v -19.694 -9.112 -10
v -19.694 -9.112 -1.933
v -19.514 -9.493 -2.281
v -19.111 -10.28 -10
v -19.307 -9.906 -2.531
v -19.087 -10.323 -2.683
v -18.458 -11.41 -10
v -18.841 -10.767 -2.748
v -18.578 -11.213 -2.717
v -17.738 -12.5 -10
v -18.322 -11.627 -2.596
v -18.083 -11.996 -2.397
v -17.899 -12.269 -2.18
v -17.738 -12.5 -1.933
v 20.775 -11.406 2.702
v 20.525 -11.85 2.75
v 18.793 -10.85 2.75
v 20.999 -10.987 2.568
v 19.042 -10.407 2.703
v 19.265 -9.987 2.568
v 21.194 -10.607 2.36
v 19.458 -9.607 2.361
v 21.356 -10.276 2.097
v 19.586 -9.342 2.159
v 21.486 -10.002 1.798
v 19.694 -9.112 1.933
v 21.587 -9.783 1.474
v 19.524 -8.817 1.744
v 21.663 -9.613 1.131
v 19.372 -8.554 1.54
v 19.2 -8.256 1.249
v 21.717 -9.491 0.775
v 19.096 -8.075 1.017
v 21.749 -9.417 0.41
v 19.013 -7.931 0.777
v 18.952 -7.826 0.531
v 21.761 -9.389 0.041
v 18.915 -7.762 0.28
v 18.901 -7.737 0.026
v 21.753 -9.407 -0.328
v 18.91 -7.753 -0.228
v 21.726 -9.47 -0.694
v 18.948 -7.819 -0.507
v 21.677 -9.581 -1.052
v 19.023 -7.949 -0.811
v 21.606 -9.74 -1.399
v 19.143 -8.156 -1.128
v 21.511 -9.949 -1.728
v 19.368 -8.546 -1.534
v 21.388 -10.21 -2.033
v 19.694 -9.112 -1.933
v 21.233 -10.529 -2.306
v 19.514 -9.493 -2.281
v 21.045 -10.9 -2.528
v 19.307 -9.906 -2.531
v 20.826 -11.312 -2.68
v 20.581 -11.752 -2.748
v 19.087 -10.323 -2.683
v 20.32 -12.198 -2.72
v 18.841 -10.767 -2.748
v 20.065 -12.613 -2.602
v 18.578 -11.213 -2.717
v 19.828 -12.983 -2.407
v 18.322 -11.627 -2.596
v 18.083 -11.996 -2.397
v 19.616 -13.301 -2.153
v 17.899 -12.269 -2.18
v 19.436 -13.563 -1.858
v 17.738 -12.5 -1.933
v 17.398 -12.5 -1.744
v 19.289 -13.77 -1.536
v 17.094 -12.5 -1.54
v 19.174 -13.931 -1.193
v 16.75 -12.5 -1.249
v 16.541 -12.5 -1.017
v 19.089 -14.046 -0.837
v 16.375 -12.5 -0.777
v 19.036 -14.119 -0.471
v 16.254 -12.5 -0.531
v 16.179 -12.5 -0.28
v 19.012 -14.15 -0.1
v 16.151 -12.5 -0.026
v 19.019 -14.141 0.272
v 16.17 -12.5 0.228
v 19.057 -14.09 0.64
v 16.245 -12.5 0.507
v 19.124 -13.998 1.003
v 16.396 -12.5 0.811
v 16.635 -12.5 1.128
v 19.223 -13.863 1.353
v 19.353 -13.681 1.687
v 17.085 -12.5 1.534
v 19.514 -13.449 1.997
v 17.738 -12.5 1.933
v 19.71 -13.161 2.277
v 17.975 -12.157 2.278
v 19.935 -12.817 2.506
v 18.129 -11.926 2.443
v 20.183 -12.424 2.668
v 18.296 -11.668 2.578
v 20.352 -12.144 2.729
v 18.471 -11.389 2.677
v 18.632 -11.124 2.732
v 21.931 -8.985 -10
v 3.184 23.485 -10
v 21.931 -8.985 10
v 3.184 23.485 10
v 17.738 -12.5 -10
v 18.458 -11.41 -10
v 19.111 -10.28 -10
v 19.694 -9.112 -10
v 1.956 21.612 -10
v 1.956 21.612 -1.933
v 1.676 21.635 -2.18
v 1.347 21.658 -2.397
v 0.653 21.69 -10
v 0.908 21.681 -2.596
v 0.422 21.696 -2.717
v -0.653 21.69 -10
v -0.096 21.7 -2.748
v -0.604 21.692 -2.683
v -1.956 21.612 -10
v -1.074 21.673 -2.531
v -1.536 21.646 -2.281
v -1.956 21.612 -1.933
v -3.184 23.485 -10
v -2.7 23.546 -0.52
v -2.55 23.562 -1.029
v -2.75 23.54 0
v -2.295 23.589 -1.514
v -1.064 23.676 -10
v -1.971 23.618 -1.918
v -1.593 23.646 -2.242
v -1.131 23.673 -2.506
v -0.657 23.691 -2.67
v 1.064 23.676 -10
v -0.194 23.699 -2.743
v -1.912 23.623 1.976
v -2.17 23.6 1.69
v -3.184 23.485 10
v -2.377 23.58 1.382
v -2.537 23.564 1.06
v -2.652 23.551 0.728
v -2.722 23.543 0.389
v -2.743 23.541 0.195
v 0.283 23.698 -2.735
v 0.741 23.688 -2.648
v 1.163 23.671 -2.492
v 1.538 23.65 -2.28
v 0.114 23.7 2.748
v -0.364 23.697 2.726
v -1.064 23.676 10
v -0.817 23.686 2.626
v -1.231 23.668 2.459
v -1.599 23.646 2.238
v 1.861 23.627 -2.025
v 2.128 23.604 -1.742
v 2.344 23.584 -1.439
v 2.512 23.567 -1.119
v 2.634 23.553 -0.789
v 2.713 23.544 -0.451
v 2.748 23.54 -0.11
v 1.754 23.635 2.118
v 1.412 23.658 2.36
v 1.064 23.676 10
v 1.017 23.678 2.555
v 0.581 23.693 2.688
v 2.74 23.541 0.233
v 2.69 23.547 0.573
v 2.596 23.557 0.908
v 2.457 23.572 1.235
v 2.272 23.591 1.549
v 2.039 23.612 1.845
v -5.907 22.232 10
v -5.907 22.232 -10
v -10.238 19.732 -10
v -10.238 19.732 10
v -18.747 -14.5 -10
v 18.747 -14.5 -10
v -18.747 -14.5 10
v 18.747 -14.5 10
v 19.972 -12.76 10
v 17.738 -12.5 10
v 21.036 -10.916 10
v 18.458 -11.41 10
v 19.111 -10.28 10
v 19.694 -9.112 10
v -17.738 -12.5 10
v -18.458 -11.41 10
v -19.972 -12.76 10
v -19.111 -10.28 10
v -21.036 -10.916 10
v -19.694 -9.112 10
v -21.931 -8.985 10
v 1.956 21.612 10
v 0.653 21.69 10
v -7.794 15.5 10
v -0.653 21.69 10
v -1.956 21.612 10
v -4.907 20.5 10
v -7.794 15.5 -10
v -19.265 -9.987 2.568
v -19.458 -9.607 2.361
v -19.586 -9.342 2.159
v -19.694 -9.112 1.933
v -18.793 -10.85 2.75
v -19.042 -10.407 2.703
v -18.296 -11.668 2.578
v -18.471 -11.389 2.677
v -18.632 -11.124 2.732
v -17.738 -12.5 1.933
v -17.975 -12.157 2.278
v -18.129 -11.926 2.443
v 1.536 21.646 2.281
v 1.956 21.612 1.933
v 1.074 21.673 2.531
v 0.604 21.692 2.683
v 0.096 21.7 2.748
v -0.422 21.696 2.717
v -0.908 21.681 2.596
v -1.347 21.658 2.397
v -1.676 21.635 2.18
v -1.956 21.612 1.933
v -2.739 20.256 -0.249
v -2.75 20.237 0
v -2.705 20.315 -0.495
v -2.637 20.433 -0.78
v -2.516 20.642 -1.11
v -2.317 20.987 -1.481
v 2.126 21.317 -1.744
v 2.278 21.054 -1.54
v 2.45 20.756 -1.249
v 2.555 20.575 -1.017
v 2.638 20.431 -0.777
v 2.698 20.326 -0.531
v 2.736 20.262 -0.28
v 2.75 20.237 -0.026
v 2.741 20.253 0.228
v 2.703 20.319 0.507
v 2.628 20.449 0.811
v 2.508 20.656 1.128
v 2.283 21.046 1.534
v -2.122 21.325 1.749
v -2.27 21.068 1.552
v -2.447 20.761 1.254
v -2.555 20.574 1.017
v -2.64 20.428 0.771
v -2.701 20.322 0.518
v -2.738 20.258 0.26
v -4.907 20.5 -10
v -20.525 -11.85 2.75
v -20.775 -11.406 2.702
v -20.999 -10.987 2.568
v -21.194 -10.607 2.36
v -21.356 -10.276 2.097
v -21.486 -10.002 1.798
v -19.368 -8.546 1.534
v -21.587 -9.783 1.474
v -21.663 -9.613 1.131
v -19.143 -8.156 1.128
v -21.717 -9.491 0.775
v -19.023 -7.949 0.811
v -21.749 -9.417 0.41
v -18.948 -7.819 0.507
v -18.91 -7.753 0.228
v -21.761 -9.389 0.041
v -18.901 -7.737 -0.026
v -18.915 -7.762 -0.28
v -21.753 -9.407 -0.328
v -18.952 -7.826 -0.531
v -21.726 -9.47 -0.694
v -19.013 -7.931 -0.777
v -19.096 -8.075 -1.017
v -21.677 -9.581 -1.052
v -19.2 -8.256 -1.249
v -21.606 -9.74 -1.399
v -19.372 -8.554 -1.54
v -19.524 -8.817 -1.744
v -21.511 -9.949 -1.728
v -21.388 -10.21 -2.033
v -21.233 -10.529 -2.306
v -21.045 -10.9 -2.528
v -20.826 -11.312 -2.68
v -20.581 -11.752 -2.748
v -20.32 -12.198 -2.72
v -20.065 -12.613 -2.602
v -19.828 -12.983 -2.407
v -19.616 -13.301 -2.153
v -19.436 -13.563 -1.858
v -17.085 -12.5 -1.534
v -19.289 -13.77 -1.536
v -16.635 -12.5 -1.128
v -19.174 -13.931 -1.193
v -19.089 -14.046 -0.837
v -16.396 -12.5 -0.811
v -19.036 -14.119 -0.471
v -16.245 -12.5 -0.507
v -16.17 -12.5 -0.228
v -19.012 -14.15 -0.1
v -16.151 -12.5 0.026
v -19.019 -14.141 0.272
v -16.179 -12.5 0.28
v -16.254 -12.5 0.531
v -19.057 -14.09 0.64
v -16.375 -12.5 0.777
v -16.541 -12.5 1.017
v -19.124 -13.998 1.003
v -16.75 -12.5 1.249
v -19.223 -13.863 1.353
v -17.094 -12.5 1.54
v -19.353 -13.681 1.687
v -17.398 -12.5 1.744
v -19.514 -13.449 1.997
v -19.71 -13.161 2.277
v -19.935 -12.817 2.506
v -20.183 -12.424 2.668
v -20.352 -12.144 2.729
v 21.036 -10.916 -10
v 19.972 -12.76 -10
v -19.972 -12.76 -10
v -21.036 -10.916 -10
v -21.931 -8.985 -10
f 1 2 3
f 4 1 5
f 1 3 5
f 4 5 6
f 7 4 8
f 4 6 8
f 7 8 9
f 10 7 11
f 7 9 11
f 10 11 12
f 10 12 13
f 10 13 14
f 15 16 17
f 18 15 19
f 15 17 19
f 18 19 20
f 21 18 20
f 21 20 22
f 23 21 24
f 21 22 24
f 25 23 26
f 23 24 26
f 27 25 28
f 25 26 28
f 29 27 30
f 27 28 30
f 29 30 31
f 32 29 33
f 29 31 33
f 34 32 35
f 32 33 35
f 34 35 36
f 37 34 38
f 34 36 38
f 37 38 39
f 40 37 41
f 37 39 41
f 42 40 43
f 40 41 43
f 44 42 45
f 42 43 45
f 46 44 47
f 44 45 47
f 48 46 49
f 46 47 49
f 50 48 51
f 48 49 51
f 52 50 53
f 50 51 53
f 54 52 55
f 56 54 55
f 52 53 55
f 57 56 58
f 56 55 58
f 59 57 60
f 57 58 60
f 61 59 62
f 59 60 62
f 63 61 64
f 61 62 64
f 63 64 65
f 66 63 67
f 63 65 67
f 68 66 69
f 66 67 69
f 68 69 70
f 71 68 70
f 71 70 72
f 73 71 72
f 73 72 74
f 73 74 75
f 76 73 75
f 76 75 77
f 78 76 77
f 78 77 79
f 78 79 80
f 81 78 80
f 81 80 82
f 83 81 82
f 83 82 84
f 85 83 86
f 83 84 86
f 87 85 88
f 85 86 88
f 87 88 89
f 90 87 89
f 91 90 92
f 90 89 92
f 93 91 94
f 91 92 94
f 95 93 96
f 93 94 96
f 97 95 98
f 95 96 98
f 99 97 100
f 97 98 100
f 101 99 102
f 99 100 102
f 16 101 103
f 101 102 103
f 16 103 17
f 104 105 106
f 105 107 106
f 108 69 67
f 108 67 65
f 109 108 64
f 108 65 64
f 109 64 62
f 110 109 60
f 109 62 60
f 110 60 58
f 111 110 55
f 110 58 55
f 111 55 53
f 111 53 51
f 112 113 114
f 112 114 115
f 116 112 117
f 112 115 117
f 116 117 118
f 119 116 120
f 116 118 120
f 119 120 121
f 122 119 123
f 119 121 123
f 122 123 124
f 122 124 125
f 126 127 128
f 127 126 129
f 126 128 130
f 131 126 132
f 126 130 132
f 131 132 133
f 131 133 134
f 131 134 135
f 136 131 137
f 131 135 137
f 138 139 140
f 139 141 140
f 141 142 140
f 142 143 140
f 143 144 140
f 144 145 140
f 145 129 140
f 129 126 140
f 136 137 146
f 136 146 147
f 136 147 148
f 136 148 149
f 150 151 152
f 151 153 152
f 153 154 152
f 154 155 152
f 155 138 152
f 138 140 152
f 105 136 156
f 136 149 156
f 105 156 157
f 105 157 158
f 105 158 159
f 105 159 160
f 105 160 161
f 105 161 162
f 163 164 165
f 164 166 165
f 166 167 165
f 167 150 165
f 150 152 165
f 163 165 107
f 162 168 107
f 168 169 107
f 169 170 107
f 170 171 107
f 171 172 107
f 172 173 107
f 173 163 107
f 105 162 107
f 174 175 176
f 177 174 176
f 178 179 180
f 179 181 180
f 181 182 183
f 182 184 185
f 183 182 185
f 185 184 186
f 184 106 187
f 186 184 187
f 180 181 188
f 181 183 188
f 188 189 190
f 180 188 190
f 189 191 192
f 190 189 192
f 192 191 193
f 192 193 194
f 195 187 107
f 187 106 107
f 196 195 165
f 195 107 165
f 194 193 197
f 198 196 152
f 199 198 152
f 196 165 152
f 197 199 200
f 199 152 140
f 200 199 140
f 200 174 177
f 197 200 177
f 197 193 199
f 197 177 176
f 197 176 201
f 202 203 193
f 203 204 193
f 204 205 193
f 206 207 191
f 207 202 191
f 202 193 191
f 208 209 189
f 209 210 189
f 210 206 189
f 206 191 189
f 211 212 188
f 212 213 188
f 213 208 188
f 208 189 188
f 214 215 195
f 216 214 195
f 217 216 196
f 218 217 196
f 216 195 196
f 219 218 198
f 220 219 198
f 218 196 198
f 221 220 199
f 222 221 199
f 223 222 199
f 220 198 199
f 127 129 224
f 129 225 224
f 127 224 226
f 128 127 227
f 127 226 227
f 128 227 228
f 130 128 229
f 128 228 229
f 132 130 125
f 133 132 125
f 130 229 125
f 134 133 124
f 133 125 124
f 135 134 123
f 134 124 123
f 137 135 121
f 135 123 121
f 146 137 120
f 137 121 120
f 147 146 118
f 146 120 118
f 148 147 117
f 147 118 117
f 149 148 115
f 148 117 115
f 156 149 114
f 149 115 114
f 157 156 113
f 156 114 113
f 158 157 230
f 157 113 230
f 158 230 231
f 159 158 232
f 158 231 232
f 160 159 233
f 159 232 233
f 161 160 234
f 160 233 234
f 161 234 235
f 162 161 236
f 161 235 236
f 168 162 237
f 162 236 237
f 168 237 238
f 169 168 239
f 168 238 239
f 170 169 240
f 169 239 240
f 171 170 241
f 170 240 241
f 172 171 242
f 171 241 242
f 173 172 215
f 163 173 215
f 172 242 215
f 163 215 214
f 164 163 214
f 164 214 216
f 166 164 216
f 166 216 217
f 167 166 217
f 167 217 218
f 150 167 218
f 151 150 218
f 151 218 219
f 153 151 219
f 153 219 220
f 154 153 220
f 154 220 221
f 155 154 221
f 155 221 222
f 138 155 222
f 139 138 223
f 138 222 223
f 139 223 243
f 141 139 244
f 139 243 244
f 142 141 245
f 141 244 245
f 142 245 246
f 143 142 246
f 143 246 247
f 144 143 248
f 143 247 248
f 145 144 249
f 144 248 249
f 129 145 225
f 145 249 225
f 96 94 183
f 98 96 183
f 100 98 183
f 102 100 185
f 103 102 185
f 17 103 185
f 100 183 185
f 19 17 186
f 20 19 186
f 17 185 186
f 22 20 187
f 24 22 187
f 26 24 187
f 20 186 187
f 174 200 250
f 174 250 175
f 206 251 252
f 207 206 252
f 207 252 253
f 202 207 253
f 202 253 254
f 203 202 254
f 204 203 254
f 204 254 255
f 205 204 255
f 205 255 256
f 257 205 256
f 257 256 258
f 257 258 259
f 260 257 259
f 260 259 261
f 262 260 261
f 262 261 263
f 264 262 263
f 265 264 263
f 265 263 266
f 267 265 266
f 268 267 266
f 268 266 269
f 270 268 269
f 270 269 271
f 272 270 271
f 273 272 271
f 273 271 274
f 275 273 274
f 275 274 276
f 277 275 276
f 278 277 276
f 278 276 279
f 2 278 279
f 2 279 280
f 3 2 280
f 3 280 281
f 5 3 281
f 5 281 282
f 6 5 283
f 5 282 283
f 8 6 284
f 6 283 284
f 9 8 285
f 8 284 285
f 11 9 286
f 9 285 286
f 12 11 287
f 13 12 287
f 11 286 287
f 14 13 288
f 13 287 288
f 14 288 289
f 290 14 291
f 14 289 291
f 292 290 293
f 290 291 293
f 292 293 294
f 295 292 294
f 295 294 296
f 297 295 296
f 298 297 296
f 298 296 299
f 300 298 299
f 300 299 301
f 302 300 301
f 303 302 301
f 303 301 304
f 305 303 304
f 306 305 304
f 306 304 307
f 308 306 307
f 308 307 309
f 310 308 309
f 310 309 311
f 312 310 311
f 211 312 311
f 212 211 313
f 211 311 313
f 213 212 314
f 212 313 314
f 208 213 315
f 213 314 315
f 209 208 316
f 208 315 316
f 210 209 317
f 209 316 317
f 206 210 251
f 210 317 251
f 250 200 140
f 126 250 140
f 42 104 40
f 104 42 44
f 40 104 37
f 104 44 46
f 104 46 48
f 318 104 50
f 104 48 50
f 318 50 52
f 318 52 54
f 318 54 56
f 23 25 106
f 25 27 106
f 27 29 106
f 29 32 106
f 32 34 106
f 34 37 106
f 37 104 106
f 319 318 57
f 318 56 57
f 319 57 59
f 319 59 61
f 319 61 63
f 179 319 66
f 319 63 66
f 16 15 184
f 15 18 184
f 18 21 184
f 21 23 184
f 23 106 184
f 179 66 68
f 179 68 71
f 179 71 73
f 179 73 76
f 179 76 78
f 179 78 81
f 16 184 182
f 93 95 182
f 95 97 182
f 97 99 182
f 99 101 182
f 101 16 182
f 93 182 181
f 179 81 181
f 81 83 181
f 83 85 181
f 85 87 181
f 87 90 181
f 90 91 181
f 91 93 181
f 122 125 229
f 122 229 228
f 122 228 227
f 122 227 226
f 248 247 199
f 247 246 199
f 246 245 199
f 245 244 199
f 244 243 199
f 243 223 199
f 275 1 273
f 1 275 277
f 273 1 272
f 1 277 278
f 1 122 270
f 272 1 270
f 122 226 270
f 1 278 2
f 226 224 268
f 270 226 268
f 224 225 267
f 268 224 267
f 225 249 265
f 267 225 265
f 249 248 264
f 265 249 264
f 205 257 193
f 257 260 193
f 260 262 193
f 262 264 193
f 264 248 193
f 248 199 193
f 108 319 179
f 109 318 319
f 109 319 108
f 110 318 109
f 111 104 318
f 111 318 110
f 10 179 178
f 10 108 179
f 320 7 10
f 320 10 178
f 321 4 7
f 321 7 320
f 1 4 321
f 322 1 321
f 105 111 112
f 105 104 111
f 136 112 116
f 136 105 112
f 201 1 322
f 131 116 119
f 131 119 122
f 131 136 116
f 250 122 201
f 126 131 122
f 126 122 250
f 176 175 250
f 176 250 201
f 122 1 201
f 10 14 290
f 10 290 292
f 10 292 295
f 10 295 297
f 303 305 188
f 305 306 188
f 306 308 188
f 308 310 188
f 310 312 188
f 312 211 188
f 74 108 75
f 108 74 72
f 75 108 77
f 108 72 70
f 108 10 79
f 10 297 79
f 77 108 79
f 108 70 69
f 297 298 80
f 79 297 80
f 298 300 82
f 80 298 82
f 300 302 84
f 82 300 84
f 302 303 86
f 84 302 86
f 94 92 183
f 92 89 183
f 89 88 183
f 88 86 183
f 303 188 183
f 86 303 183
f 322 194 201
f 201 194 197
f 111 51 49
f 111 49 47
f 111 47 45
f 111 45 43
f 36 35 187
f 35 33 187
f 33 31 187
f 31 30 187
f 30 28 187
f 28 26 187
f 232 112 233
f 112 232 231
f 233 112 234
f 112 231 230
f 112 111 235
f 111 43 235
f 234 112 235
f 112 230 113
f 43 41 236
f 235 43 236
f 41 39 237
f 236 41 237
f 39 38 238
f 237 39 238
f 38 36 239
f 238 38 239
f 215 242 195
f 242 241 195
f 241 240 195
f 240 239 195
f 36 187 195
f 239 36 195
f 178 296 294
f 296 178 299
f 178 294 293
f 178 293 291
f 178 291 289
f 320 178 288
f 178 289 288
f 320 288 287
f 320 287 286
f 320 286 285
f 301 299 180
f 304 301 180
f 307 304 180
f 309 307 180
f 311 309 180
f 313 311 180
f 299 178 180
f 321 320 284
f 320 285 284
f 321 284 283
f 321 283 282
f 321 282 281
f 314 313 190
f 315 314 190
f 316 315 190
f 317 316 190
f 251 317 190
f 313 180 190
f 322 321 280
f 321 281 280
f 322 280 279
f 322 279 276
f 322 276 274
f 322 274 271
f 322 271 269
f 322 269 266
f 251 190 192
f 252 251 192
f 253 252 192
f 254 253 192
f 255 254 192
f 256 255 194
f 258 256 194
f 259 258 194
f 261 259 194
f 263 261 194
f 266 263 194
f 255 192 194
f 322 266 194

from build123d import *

# Parameters (mm, degrees)
BOSS_EXTRU_1_DEPTH      = 10
ESQUISSE2_R             = 2.75
ENL_V_MAT_EXTRU_1_DEPTH = 10
ESQUISSE3_R             = 2.75
ENL_V_MAT_EXTRU_2_DEPTH = 10
ESQUISSE4_R             = 2.75
ENL_V_MAT_EXTRU_3_DEPTH = 10
BOSS_EXTRU_4_DEPTH      = 20


with BuildPart() as part:
    # Esquisse1 → Boss.-Extru.1 (new body, symmetric)
    with BuildSketch(Plane.XY):
        with BuildLine():
            ThreePointArc((-3.184001831, 23.485147058), (0, 23.7), (3.184001831, 23.485147058))
            Line((3.184001831, 23.485147058), (21.930734879, -8.985147058))
            ThreePointArc((21.930734879, -8.985147058), (20.52480207, -11.85), (18.746733049, -14.5))
            Line((18.746733049, -14.5), (-18.746733049, -14.5))
            ThreePointArc((-18.746733049, -14.5), (-20.52480207, -11.85), (-21.930734879, -8.985147058))
            Line((-21.930734879, -8.985147058), (-3.184001831, 23.485147058))
        make_face()
        with BuildLine():
            ThreePointArc((17.738094599, -12.5), (18.792751262, -10.85), (19.694364847, -9.111640537))
            Line((19.694364847, -9.111640537), (1.956270248, 21.611640537))
            ThreePointArc((1.956270248, 21.611640537), (0, 21.7), (-1.956270248, 21.611640537))
            Line((-1.956270248, 21.611640537), (-19.694364847, -9.111640537))
            ThreePointArc((-19.694364847, -9.111640537), (-18.792751262, -10.85), (-17.738094599, -12.5))
            Line((-17.738094599, -12.5), (17.738094599, -12.5))
        make_face(mode=Mode.SUBTRACT)
    extrude(amount=BOSS_EXTRU_1_DEPTH, both=True)

    # Esquisse2 → Enlèv. mat.-Extru.1 (cut, symmetric)
    with BuildSketch(Plane(origin=(20.338733964, -11.742573529, 0), x_dir=(0, 0, 1), z_dir=(-0.866025404, 0.5, 0))):
        Circle(ESQUISSE2_R)
    extrude(amount=ENL_V_MAT_EXTRU_1_DEPTH, both=True, mode=Mode.SUBTRACT)

    # Esquisse3 → Enlèv. mat.-Extru.2 (cut, symmetric)
    with BuildSketch(Plane(origin=(-20.338733964, -11.742573529, 0), x_dir=(0, 0, 1), z_dir=(-0.866025404, -0.5, 0))):
        Circle(ESQUISSE3_R)
    extrude(amount=ENL_V_MAT_EXTRU_2_DEPTH, both=True, mode=Mode.SUBTRACT)

    # Esquisse4 → Enlèv. mat.-Extru.3 (cut, symmetric)
    with BuildSketch(Plane(origin=(0, 23.485147058, 0), x_dir=(-1, 0, 0), z_dir=(0, -1, 0))):
        Circle(ESQUISSE4_R)
    extrude(amount=ENL_V_MAT_EXTRU_3_DEPTH, both=True, mode=Mode.SUBTRACT)

    # Esquisse6 → Boss.-Extru.4 (add)
    with BuildSketch(Plane(origin=(0, 0, -10), x_dir=(-1, 0, 0), z_dir=(0, 0, -1))):
        Polygon((4.907477288, 20.5), (5.907477288, 22.232050808), (10.237604307, 19.732050808), (7.794228634, 15.5), align=None)
    extrude(amount=-BOSS_EXTRU_4_DEPTH)


solid = part.part
